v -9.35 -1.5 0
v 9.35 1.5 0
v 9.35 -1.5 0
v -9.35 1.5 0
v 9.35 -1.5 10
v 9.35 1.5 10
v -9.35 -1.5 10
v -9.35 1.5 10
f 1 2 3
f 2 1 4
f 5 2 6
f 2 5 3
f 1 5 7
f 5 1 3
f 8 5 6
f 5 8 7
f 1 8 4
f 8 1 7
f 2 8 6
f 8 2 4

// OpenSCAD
// Built by bench/smallmodels/features/compiler.py from a list of features.
$fn = 64;
difference() {
  union() {
    translate([0, 0, 0]) linear_extrude(height = 10) polygon([[-9.35, -1.5], [9.35, -1.5], [9.35, 1.5], [-9.35, 1.5]]);
  }
  union() {
    translate([-25, 0, 0]) rotate([0, 0, 0]) translate([-5, -4, 0]) cube([10, 8, 10]);
    translate([29.5, 0, 0]) rotate([0, 0, 0]) translate([-5, -2.25, 0]) cube([10, 4.5, 10]);
  }
}
